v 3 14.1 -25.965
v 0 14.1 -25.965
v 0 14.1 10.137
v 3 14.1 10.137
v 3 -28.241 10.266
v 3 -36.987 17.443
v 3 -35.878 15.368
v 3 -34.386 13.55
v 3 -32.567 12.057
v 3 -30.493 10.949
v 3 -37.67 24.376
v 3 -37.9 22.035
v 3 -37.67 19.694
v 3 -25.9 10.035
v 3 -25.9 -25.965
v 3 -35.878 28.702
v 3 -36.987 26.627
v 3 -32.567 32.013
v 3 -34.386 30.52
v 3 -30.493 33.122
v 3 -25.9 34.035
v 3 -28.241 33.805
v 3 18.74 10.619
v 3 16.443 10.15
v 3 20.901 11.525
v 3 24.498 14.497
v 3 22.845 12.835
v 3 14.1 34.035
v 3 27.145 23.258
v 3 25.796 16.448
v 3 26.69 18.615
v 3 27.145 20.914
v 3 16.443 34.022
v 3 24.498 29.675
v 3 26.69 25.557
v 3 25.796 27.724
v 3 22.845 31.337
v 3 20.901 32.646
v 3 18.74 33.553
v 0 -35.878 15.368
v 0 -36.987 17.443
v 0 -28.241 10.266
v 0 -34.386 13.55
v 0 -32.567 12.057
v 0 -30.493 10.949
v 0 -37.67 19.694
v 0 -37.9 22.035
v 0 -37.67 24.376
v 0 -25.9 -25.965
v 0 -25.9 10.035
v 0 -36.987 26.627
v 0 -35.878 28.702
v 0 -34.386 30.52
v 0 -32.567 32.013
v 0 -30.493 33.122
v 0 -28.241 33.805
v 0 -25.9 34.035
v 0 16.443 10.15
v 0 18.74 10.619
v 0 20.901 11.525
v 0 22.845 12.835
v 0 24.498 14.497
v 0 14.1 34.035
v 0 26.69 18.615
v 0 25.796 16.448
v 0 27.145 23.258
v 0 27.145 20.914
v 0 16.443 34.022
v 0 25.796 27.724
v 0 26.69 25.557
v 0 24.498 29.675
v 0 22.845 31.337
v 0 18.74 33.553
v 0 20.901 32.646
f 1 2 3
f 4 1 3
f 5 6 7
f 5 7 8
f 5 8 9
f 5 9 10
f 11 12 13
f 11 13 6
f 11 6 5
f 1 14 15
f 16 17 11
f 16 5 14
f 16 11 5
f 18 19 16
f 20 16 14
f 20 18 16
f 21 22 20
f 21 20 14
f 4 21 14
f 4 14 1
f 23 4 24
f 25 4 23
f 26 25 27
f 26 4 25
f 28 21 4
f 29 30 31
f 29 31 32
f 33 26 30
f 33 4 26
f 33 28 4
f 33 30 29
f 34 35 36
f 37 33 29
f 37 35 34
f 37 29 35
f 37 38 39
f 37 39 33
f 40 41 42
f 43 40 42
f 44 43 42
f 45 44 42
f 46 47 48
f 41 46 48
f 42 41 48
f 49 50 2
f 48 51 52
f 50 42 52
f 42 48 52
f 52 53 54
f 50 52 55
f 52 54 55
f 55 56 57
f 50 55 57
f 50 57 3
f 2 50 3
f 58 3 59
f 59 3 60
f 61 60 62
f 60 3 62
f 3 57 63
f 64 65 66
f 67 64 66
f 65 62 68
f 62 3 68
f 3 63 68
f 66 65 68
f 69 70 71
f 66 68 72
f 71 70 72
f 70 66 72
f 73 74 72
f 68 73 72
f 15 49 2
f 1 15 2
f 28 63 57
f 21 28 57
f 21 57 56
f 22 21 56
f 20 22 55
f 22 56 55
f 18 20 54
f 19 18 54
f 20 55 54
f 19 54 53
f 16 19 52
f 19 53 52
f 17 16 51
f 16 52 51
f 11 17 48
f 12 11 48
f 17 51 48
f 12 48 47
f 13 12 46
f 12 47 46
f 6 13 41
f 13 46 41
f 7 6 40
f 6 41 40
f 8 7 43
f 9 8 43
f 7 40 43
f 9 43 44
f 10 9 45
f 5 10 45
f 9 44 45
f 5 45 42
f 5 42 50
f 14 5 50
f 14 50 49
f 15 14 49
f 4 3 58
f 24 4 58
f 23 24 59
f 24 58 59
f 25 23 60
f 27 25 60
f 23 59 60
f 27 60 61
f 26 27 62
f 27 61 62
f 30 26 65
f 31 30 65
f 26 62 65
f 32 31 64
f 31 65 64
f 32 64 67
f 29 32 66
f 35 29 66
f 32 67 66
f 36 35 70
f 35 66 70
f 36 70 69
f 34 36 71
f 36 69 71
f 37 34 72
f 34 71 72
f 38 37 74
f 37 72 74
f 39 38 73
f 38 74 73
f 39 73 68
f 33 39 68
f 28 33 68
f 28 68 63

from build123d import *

# Parameters (mm, degrees)
F1_DEPTH = 3


with BuildPart() as f1:
    # F0 (on Right) → F1 (new body)
    with BuildSketch(Plane.YZ):
        with BuildLine():
            ThreePointArc((-25.900381, 34.035096), (-37.900381, 22.035096), (-25.900381, 10.035096))
            Line((-25.900381, 10.035096), (-25.900381, -25.964904))
            Line((-25.900381, -25.964904), (14.099619, -25.964904))
            Line((14.099619, -25.964904), (14.099619, 10.136678))
            ThreePointArc((14.099619, 10.136678), (27.202525, 22.085887), (14.099619, 34.035096))
            Line((14.099619, 34.035096), (-25.900381, 34.035096))
        make_face()
    extrude(amount=F1_DEPTH)


solid = f1.part
